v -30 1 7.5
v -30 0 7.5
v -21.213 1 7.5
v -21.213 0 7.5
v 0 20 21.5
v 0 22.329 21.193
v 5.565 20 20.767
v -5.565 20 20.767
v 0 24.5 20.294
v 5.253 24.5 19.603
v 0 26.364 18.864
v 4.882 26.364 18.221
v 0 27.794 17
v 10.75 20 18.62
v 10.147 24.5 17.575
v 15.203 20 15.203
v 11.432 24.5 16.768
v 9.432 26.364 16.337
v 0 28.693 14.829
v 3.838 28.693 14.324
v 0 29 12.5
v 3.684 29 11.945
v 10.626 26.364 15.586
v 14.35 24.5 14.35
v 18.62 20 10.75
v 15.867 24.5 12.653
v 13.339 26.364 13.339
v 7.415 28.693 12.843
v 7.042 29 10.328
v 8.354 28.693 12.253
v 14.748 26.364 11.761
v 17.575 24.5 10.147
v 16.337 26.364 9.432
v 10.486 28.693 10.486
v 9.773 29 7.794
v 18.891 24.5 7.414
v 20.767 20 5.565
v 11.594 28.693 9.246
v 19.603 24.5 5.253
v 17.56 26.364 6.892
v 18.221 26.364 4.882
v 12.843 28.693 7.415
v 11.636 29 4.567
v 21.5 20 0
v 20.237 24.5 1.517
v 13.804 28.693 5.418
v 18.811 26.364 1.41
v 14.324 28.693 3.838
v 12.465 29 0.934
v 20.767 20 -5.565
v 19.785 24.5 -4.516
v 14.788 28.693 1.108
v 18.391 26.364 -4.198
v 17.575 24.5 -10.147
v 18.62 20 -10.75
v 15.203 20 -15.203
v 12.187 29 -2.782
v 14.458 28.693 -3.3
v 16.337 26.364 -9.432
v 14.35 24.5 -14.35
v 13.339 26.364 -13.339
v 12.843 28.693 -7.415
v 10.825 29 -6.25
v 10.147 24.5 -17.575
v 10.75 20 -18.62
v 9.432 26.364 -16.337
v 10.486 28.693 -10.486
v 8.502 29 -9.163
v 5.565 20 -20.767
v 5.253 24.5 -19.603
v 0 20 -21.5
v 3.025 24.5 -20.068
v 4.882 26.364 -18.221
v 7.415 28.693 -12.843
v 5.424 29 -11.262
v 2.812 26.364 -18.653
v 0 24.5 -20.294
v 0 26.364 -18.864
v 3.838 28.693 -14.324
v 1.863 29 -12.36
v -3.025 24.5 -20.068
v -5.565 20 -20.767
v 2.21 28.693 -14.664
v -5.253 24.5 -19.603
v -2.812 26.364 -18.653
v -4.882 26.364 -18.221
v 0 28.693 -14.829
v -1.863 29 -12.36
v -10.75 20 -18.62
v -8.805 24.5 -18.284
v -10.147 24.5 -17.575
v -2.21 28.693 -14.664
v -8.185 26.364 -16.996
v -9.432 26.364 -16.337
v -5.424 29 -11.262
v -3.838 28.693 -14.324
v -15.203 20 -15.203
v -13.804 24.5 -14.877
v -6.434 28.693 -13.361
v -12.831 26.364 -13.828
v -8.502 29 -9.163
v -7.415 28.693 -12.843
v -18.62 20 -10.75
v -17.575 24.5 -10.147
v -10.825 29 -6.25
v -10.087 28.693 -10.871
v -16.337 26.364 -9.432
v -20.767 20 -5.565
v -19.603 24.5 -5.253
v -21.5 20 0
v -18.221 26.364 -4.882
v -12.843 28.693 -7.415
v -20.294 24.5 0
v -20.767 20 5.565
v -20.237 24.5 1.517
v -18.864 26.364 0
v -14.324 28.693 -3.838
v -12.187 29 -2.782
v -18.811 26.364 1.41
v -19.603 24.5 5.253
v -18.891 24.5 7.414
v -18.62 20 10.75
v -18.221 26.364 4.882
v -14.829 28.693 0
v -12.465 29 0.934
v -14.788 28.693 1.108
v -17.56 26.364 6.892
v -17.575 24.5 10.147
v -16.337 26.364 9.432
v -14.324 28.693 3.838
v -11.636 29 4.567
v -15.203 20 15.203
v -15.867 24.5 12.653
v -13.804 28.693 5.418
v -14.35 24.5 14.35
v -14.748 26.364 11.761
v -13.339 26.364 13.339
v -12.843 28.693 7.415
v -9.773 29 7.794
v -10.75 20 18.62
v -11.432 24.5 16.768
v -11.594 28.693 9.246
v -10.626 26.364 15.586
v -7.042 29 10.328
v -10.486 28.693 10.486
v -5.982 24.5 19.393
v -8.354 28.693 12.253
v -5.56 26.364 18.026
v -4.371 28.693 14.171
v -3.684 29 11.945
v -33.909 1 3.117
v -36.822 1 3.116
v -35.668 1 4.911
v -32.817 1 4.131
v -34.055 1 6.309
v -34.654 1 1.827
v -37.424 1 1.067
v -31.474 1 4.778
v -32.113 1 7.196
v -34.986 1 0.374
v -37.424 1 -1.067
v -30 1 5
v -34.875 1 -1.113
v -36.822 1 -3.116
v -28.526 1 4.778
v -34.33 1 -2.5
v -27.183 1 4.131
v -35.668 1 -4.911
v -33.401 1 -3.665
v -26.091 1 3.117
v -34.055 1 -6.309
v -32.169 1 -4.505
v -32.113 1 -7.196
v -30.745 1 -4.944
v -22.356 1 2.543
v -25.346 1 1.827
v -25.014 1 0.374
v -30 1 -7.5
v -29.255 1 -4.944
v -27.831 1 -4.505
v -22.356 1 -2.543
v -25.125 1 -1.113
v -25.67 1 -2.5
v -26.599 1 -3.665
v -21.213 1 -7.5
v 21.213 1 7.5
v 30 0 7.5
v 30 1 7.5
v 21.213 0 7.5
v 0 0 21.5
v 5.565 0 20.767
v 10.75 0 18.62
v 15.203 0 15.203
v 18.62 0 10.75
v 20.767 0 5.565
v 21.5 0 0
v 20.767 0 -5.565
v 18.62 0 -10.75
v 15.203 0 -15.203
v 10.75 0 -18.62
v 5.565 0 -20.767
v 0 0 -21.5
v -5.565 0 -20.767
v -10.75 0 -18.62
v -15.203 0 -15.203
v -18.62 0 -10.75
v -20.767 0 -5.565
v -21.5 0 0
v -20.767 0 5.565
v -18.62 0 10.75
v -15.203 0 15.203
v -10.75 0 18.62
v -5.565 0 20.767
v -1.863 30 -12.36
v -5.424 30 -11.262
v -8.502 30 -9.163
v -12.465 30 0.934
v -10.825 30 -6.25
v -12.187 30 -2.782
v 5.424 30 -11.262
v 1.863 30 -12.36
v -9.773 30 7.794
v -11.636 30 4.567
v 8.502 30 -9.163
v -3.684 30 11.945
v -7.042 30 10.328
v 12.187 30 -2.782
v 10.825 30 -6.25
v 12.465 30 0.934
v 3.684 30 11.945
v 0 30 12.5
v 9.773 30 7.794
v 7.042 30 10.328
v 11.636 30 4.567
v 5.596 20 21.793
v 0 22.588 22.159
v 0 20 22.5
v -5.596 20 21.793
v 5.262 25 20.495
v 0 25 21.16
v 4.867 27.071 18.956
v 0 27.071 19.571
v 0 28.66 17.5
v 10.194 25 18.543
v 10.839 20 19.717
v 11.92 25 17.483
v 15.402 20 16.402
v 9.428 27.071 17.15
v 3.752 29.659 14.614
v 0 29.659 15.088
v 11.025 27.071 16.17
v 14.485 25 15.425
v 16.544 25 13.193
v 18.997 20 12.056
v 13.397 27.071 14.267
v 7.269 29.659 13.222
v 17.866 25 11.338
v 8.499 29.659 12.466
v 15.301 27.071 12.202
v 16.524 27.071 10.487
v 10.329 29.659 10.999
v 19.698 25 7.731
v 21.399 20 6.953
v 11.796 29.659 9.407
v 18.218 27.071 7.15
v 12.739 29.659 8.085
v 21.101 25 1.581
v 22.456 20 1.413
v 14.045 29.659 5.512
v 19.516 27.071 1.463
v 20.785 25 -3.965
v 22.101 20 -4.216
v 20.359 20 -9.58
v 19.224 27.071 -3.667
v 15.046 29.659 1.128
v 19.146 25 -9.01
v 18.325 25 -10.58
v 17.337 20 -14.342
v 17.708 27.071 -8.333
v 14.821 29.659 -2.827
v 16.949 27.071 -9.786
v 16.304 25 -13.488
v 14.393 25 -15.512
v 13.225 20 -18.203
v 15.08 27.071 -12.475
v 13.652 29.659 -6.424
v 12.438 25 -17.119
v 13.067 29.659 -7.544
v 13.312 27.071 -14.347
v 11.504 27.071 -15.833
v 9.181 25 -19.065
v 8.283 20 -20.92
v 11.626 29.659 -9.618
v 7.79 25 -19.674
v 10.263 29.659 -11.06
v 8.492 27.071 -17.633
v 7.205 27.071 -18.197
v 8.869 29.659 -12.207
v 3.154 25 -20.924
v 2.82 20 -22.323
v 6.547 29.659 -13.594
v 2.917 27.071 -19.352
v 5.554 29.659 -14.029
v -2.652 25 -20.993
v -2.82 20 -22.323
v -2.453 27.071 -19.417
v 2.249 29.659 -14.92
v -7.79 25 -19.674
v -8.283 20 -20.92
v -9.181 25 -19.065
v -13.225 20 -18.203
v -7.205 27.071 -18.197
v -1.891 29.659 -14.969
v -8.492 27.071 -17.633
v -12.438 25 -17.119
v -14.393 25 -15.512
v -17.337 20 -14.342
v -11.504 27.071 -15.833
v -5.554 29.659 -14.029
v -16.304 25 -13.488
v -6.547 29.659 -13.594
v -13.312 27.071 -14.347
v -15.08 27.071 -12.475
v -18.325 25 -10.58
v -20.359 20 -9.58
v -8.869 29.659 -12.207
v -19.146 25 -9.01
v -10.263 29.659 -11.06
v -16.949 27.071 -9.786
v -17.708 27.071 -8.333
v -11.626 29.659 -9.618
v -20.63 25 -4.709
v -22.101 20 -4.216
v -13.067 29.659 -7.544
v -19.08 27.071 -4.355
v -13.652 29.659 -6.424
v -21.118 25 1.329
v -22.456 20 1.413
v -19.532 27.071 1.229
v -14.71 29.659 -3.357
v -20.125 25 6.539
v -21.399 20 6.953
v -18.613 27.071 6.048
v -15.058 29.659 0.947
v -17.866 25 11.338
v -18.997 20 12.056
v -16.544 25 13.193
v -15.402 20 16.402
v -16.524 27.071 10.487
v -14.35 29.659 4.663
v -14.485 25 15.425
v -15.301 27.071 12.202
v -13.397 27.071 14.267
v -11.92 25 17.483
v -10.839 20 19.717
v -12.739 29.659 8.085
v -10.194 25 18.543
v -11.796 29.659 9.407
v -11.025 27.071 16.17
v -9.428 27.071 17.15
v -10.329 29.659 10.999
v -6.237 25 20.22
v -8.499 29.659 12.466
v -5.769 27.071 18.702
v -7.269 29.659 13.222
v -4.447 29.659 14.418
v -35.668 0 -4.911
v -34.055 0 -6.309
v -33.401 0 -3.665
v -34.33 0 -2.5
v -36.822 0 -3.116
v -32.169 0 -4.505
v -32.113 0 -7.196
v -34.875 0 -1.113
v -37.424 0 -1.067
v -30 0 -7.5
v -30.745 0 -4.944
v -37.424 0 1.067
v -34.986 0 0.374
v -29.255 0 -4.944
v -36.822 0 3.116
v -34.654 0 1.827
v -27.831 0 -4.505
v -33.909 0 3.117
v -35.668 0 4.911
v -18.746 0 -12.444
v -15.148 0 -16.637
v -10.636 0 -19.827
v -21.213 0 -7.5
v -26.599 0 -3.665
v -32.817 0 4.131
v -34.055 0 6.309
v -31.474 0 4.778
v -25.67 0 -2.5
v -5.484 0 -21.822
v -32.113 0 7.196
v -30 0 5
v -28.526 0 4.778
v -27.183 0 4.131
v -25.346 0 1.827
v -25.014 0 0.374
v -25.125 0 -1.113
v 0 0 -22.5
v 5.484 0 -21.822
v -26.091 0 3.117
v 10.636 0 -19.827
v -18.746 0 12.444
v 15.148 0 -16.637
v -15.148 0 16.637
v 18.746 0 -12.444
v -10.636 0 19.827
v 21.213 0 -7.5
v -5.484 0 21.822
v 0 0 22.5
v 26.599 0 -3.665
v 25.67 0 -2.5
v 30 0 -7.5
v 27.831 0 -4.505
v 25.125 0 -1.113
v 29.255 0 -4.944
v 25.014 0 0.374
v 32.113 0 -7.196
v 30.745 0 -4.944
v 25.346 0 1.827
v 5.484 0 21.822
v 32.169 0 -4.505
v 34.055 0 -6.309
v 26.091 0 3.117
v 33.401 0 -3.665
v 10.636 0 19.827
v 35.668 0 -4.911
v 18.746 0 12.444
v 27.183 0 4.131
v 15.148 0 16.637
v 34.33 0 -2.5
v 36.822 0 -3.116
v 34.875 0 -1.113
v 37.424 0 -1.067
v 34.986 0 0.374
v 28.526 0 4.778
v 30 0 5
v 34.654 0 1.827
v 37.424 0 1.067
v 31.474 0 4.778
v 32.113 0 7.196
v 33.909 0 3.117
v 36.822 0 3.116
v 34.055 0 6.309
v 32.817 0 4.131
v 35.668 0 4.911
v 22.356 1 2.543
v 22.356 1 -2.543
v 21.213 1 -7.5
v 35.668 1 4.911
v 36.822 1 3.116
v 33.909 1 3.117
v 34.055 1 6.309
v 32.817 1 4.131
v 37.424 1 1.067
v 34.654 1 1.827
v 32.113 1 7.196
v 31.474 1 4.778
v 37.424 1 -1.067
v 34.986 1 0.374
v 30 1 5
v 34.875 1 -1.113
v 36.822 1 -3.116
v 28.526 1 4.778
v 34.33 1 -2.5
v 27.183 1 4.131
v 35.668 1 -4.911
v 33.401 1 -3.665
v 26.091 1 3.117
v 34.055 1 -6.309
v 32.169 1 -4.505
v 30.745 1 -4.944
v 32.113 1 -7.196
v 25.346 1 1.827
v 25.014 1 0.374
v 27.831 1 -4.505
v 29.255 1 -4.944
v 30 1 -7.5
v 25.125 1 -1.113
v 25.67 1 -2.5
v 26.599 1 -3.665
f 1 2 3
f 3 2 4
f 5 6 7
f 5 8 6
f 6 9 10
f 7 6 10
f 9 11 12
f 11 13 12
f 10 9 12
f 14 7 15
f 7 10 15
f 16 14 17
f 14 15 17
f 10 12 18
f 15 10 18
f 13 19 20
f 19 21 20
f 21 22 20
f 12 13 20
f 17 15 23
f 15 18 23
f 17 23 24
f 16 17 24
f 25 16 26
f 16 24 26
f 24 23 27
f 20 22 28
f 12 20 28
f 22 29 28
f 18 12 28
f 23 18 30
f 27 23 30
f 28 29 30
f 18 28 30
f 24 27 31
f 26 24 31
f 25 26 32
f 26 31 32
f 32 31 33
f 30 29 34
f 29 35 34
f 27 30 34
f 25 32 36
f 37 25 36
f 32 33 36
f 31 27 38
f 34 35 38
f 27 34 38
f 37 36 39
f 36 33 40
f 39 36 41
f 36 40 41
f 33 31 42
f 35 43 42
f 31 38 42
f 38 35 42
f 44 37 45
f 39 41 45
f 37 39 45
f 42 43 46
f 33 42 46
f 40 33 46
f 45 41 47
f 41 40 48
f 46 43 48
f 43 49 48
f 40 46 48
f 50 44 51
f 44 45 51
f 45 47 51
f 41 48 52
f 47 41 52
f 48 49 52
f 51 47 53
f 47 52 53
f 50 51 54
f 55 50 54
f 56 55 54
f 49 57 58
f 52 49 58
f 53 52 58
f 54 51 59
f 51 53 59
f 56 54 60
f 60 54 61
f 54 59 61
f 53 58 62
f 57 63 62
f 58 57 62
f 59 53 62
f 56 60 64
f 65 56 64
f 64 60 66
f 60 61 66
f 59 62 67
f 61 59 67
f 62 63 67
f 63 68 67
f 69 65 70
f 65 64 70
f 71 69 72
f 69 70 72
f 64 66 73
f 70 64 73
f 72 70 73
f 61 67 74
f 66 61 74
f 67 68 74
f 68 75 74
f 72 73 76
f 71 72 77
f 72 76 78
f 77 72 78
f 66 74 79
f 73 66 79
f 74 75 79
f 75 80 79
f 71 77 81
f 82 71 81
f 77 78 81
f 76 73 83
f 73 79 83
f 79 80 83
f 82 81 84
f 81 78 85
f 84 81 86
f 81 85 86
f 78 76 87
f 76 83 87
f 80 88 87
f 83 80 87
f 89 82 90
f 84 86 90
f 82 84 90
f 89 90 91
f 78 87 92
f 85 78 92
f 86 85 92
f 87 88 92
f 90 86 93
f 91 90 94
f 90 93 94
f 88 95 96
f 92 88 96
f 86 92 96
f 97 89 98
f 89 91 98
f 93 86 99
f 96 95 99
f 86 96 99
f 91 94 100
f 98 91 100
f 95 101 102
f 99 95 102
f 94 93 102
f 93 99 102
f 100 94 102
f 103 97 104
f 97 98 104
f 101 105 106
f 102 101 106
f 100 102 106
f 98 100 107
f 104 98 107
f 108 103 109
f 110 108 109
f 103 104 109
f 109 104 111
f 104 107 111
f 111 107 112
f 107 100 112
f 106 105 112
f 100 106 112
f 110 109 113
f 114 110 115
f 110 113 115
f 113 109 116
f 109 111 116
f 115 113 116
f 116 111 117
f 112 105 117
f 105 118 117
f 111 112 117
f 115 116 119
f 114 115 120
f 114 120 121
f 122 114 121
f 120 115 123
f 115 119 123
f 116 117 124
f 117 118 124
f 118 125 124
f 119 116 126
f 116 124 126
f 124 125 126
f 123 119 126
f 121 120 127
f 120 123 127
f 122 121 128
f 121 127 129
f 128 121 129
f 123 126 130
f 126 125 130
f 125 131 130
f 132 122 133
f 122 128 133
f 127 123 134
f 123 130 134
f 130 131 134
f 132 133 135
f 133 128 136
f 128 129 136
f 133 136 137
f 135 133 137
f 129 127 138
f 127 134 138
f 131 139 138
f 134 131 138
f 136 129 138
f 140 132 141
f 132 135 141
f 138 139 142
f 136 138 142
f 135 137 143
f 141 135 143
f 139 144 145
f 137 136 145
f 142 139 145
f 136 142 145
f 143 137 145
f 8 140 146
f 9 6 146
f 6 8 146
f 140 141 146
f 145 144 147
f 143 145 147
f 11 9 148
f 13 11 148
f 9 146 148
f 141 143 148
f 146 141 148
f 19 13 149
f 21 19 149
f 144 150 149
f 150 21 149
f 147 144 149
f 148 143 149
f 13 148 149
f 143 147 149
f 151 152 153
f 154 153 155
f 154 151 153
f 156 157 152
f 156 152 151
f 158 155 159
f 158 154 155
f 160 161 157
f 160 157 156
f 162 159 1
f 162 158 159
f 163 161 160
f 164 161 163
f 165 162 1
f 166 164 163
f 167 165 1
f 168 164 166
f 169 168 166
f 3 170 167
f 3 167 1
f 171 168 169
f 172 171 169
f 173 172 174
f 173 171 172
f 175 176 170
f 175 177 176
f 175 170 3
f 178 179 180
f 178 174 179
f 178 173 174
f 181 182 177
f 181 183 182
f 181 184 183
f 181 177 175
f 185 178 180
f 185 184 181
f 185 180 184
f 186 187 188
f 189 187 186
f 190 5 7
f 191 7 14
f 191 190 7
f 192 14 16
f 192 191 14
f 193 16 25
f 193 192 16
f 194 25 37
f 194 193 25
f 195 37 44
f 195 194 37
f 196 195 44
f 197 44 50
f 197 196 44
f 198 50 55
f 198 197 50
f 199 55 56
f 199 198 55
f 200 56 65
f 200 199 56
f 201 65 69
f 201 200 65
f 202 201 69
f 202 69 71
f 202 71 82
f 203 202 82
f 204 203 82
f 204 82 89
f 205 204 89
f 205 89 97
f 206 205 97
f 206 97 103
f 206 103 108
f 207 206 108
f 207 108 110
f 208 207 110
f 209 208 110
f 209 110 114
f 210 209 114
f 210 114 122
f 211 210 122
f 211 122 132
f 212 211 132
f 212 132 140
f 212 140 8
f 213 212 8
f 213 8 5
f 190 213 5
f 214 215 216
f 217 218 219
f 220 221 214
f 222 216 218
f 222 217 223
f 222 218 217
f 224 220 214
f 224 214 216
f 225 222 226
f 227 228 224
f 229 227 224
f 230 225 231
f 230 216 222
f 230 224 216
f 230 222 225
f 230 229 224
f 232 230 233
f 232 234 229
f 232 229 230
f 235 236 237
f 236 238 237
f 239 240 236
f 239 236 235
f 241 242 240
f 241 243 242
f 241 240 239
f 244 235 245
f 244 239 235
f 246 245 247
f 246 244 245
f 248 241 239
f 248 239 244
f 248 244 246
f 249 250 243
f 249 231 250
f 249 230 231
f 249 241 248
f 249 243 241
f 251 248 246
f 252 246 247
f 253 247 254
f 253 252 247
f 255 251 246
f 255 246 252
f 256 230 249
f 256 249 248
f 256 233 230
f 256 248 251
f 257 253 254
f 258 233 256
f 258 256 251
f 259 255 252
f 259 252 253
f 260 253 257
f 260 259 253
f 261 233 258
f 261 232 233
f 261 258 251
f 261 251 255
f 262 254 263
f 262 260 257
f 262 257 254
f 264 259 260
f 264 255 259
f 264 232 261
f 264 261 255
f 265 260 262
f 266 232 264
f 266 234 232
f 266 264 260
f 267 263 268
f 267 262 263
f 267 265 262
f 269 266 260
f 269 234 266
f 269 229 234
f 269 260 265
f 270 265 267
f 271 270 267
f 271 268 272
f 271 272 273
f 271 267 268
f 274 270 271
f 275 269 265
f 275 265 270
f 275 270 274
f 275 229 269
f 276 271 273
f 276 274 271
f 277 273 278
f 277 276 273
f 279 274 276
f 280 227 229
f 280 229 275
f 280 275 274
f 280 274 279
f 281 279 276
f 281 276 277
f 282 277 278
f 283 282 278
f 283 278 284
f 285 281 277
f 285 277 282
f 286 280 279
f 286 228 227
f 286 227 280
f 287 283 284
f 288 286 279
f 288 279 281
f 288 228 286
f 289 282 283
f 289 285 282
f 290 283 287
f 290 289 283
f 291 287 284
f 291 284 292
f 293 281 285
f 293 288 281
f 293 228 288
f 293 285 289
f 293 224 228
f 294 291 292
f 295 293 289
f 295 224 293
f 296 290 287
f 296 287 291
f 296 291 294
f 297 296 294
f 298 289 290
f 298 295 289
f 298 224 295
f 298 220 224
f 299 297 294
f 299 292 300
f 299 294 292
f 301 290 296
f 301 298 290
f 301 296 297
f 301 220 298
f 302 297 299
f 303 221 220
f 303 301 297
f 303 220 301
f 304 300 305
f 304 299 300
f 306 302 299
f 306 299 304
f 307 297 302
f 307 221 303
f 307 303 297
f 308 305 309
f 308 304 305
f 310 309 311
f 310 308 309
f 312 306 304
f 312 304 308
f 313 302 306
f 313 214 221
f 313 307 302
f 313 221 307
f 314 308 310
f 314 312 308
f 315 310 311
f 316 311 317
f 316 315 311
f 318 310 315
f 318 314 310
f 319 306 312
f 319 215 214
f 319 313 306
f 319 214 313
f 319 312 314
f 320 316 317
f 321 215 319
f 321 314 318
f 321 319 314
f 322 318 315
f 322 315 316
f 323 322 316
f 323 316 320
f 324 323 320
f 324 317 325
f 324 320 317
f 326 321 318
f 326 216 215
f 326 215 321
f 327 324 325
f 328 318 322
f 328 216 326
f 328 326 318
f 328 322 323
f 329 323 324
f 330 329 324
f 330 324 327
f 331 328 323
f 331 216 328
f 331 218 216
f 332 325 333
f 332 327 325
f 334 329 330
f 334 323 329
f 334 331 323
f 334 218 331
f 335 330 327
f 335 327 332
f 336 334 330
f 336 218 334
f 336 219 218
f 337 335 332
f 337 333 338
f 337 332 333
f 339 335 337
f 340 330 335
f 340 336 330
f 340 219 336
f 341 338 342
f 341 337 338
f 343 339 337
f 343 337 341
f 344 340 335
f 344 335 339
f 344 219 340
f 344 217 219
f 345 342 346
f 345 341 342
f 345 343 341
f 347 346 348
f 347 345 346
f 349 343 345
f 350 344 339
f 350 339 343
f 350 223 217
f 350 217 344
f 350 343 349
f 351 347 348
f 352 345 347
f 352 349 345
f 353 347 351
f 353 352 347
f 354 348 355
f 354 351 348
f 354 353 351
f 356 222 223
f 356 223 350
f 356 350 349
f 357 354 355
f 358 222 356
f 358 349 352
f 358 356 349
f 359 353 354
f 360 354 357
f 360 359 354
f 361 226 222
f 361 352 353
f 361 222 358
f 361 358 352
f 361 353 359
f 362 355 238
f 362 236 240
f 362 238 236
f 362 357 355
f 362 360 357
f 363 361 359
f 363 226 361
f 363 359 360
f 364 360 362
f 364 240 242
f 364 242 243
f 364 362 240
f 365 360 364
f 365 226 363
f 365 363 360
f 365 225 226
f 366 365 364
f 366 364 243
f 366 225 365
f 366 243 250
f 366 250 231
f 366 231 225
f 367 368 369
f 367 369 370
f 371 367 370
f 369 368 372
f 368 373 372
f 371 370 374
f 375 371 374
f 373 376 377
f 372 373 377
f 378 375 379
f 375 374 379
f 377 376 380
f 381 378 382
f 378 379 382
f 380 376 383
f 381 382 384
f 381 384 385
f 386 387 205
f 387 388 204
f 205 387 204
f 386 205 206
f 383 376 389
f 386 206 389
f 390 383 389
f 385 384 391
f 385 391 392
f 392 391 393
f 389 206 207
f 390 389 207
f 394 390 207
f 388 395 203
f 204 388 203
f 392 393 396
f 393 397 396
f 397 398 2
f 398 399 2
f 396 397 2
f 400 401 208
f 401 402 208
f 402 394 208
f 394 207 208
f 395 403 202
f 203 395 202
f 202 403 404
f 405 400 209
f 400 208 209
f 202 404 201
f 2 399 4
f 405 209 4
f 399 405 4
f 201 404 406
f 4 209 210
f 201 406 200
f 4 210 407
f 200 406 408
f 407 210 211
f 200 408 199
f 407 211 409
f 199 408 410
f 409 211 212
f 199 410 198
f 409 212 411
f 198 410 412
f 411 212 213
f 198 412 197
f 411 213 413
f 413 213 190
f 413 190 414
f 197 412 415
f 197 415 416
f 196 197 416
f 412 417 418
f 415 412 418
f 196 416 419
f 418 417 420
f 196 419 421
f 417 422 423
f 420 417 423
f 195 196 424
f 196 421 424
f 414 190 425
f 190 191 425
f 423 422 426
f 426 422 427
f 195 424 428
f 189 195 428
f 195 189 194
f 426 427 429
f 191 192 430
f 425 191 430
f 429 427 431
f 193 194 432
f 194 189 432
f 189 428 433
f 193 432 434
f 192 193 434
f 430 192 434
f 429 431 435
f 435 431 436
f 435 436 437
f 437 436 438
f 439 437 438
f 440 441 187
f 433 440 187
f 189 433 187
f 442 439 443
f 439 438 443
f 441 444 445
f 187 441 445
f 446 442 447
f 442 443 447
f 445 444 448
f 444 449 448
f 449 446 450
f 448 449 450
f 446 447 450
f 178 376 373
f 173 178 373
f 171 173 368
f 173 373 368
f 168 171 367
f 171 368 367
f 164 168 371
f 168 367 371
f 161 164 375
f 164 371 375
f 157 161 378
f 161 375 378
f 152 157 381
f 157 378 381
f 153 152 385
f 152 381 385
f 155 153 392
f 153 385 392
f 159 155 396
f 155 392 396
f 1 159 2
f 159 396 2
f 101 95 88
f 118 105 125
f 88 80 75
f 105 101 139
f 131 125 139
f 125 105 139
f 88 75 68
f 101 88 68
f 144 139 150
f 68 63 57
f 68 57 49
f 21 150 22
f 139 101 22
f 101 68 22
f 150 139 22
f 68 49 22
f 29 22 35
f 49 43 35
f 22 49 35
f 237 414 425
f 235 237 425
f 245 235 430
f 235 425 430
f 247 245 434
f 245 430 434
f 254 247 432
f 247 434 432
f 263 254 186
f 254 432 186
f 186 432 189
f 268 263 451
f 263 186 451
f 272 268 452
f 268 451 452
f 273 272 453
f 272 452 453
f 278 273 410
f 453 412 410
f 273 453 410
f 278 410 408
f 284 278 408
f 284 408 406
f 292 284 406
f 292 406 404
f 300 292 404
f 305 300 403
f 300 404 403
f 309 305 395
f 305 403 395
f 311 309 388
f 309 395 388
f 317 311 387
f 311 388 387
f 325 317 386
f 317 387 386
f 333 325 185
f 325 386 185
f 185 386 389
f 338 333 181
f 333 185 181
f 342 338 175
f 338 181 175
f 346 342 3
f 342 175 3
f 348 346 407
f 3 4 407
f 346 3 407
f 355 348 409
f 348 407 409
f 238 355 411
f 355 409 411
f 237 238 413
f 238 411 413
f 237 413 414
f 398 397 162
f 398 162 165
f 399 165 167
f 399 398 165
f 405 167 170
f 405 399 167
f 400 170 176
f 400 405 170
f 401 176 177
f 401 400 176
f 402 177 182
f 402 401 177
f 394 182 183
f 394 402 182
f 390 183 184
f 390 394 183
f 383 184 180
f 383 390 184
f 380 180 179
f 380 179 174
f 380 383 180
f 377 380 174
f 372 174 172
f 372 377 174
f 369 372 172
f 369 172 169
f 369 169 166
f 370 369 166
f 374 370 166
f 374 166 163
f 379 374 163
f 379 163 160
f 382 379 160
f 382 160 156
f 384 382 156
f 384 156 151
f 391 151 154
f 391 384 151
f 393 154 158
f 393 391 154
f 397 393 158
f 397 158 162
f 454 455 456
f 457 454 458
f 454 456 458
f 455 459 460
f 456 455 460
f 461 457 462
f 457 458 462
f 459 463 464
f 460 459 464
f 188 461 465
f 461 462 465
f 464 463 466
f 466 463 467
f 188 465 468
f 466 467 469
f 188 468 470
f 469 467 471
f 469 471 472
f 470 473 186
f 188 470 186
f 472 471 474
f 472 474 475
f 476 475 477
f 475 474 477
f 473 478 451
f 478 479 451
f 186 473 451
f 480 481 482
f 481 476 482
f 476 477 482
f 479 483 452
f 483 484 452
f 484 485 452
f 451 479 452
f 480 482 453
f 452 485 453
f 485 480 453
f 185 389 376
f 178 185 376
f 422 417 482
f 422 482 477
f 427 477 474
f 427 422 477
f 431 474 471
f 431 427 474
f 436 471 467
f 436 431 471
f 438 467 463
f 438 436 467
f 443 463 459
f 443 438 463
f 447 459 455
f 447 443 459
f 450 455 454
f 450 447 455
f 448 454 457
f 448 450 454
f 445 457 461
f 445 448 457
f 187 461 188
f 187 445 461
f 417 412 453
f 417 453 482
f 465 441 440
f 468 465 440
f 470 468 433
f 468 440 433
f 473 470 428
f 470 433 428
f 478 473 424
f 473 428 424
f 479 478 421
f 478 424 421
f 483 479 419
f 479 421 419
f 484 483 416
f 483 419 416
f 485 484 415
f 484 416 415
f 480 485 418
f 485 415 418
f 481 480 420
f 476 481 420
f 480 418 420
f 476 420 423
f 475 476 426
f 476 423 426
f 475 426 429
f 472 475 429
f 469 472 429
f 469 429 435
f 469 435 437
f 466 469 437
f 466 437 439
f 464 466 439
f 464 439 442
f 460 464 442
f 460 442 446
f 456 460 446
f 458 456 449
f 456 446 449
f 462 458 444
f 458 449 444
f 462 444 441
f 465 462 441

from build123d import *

# Parameters (mm, degrees)
SKETCH_2_R      = 22.5
EXTRUDE_1_DEPTH = 30
FILLET_1_R      = 10
SHELL_1_T       = -1
SKETCH_3_R      = 5
EXTRUDE_2_DEPTH = 1


with BuildPart() as part:
    # 草图2 → 凸台-拉伸1 (new body)
    with BuildSketch(Plane(origin=(0, 0, 0), x_dir=(1, 0, 0), z_dir=(0, 1, 0))):
        with Locations(Location((0, 0, 0), (0, 0, 270))):
            Circle(SKETCH_2_R)
    extrude(amount=EXTRUDE_1_DEPTH)

    # 圆角1
    fillet_1_edges = [part.edges().sort_by_distance(p)[0] for p in [
        (0, 30, -22.5),
    ]]
    fillet(fillet_1_edges, radius=FILLET_1_R)

    # 抽壳1
    shell_1_openings = [part.faces().sort_by_distance(p)[0] for p in [
        (0, 0, 0),
    ]]
    offset(amount=SHELL_1_T, openings=shell_1_openings, kind=Kind.INTERSECTION)

    # 草图3 → 凸台-拉伸2 (add)
    with BuildSketch(Plane(origin=(0, 0, 0), x_dir=(1, 0, 0), z_dir=(0, 1, 0))):
        with BuildLine():
            Line((-21.213203436, 7.5), (-30, 7.5))
            ThreePointArc((-30, 7.5), (-37.5, 0), (-30, -7.5))
            Line((-30, -7.5), (-21.213203436, -7.5))
            ThreePointArc((-21.213203436, -7.5), (-22.5, 0), (-21.213203436, 7.5))
        make_face()
        with Locations(Location((-30, 0, 0), (0, 0, 270))):
            Circle(SKETCH_3_R, mode=Mode.SUBTRACT)
    extrude_2 = extrude(amount=EXTRUDE_2_DEPTH)

    # 镜向1: 凸台-拉伸2 across plane
    add(extrude_2.mirror(Plane(origin=(0, 0, 0), x_dir=(0, 0, 1), z_dir=(1, 0, 0))))


solid = part.part
